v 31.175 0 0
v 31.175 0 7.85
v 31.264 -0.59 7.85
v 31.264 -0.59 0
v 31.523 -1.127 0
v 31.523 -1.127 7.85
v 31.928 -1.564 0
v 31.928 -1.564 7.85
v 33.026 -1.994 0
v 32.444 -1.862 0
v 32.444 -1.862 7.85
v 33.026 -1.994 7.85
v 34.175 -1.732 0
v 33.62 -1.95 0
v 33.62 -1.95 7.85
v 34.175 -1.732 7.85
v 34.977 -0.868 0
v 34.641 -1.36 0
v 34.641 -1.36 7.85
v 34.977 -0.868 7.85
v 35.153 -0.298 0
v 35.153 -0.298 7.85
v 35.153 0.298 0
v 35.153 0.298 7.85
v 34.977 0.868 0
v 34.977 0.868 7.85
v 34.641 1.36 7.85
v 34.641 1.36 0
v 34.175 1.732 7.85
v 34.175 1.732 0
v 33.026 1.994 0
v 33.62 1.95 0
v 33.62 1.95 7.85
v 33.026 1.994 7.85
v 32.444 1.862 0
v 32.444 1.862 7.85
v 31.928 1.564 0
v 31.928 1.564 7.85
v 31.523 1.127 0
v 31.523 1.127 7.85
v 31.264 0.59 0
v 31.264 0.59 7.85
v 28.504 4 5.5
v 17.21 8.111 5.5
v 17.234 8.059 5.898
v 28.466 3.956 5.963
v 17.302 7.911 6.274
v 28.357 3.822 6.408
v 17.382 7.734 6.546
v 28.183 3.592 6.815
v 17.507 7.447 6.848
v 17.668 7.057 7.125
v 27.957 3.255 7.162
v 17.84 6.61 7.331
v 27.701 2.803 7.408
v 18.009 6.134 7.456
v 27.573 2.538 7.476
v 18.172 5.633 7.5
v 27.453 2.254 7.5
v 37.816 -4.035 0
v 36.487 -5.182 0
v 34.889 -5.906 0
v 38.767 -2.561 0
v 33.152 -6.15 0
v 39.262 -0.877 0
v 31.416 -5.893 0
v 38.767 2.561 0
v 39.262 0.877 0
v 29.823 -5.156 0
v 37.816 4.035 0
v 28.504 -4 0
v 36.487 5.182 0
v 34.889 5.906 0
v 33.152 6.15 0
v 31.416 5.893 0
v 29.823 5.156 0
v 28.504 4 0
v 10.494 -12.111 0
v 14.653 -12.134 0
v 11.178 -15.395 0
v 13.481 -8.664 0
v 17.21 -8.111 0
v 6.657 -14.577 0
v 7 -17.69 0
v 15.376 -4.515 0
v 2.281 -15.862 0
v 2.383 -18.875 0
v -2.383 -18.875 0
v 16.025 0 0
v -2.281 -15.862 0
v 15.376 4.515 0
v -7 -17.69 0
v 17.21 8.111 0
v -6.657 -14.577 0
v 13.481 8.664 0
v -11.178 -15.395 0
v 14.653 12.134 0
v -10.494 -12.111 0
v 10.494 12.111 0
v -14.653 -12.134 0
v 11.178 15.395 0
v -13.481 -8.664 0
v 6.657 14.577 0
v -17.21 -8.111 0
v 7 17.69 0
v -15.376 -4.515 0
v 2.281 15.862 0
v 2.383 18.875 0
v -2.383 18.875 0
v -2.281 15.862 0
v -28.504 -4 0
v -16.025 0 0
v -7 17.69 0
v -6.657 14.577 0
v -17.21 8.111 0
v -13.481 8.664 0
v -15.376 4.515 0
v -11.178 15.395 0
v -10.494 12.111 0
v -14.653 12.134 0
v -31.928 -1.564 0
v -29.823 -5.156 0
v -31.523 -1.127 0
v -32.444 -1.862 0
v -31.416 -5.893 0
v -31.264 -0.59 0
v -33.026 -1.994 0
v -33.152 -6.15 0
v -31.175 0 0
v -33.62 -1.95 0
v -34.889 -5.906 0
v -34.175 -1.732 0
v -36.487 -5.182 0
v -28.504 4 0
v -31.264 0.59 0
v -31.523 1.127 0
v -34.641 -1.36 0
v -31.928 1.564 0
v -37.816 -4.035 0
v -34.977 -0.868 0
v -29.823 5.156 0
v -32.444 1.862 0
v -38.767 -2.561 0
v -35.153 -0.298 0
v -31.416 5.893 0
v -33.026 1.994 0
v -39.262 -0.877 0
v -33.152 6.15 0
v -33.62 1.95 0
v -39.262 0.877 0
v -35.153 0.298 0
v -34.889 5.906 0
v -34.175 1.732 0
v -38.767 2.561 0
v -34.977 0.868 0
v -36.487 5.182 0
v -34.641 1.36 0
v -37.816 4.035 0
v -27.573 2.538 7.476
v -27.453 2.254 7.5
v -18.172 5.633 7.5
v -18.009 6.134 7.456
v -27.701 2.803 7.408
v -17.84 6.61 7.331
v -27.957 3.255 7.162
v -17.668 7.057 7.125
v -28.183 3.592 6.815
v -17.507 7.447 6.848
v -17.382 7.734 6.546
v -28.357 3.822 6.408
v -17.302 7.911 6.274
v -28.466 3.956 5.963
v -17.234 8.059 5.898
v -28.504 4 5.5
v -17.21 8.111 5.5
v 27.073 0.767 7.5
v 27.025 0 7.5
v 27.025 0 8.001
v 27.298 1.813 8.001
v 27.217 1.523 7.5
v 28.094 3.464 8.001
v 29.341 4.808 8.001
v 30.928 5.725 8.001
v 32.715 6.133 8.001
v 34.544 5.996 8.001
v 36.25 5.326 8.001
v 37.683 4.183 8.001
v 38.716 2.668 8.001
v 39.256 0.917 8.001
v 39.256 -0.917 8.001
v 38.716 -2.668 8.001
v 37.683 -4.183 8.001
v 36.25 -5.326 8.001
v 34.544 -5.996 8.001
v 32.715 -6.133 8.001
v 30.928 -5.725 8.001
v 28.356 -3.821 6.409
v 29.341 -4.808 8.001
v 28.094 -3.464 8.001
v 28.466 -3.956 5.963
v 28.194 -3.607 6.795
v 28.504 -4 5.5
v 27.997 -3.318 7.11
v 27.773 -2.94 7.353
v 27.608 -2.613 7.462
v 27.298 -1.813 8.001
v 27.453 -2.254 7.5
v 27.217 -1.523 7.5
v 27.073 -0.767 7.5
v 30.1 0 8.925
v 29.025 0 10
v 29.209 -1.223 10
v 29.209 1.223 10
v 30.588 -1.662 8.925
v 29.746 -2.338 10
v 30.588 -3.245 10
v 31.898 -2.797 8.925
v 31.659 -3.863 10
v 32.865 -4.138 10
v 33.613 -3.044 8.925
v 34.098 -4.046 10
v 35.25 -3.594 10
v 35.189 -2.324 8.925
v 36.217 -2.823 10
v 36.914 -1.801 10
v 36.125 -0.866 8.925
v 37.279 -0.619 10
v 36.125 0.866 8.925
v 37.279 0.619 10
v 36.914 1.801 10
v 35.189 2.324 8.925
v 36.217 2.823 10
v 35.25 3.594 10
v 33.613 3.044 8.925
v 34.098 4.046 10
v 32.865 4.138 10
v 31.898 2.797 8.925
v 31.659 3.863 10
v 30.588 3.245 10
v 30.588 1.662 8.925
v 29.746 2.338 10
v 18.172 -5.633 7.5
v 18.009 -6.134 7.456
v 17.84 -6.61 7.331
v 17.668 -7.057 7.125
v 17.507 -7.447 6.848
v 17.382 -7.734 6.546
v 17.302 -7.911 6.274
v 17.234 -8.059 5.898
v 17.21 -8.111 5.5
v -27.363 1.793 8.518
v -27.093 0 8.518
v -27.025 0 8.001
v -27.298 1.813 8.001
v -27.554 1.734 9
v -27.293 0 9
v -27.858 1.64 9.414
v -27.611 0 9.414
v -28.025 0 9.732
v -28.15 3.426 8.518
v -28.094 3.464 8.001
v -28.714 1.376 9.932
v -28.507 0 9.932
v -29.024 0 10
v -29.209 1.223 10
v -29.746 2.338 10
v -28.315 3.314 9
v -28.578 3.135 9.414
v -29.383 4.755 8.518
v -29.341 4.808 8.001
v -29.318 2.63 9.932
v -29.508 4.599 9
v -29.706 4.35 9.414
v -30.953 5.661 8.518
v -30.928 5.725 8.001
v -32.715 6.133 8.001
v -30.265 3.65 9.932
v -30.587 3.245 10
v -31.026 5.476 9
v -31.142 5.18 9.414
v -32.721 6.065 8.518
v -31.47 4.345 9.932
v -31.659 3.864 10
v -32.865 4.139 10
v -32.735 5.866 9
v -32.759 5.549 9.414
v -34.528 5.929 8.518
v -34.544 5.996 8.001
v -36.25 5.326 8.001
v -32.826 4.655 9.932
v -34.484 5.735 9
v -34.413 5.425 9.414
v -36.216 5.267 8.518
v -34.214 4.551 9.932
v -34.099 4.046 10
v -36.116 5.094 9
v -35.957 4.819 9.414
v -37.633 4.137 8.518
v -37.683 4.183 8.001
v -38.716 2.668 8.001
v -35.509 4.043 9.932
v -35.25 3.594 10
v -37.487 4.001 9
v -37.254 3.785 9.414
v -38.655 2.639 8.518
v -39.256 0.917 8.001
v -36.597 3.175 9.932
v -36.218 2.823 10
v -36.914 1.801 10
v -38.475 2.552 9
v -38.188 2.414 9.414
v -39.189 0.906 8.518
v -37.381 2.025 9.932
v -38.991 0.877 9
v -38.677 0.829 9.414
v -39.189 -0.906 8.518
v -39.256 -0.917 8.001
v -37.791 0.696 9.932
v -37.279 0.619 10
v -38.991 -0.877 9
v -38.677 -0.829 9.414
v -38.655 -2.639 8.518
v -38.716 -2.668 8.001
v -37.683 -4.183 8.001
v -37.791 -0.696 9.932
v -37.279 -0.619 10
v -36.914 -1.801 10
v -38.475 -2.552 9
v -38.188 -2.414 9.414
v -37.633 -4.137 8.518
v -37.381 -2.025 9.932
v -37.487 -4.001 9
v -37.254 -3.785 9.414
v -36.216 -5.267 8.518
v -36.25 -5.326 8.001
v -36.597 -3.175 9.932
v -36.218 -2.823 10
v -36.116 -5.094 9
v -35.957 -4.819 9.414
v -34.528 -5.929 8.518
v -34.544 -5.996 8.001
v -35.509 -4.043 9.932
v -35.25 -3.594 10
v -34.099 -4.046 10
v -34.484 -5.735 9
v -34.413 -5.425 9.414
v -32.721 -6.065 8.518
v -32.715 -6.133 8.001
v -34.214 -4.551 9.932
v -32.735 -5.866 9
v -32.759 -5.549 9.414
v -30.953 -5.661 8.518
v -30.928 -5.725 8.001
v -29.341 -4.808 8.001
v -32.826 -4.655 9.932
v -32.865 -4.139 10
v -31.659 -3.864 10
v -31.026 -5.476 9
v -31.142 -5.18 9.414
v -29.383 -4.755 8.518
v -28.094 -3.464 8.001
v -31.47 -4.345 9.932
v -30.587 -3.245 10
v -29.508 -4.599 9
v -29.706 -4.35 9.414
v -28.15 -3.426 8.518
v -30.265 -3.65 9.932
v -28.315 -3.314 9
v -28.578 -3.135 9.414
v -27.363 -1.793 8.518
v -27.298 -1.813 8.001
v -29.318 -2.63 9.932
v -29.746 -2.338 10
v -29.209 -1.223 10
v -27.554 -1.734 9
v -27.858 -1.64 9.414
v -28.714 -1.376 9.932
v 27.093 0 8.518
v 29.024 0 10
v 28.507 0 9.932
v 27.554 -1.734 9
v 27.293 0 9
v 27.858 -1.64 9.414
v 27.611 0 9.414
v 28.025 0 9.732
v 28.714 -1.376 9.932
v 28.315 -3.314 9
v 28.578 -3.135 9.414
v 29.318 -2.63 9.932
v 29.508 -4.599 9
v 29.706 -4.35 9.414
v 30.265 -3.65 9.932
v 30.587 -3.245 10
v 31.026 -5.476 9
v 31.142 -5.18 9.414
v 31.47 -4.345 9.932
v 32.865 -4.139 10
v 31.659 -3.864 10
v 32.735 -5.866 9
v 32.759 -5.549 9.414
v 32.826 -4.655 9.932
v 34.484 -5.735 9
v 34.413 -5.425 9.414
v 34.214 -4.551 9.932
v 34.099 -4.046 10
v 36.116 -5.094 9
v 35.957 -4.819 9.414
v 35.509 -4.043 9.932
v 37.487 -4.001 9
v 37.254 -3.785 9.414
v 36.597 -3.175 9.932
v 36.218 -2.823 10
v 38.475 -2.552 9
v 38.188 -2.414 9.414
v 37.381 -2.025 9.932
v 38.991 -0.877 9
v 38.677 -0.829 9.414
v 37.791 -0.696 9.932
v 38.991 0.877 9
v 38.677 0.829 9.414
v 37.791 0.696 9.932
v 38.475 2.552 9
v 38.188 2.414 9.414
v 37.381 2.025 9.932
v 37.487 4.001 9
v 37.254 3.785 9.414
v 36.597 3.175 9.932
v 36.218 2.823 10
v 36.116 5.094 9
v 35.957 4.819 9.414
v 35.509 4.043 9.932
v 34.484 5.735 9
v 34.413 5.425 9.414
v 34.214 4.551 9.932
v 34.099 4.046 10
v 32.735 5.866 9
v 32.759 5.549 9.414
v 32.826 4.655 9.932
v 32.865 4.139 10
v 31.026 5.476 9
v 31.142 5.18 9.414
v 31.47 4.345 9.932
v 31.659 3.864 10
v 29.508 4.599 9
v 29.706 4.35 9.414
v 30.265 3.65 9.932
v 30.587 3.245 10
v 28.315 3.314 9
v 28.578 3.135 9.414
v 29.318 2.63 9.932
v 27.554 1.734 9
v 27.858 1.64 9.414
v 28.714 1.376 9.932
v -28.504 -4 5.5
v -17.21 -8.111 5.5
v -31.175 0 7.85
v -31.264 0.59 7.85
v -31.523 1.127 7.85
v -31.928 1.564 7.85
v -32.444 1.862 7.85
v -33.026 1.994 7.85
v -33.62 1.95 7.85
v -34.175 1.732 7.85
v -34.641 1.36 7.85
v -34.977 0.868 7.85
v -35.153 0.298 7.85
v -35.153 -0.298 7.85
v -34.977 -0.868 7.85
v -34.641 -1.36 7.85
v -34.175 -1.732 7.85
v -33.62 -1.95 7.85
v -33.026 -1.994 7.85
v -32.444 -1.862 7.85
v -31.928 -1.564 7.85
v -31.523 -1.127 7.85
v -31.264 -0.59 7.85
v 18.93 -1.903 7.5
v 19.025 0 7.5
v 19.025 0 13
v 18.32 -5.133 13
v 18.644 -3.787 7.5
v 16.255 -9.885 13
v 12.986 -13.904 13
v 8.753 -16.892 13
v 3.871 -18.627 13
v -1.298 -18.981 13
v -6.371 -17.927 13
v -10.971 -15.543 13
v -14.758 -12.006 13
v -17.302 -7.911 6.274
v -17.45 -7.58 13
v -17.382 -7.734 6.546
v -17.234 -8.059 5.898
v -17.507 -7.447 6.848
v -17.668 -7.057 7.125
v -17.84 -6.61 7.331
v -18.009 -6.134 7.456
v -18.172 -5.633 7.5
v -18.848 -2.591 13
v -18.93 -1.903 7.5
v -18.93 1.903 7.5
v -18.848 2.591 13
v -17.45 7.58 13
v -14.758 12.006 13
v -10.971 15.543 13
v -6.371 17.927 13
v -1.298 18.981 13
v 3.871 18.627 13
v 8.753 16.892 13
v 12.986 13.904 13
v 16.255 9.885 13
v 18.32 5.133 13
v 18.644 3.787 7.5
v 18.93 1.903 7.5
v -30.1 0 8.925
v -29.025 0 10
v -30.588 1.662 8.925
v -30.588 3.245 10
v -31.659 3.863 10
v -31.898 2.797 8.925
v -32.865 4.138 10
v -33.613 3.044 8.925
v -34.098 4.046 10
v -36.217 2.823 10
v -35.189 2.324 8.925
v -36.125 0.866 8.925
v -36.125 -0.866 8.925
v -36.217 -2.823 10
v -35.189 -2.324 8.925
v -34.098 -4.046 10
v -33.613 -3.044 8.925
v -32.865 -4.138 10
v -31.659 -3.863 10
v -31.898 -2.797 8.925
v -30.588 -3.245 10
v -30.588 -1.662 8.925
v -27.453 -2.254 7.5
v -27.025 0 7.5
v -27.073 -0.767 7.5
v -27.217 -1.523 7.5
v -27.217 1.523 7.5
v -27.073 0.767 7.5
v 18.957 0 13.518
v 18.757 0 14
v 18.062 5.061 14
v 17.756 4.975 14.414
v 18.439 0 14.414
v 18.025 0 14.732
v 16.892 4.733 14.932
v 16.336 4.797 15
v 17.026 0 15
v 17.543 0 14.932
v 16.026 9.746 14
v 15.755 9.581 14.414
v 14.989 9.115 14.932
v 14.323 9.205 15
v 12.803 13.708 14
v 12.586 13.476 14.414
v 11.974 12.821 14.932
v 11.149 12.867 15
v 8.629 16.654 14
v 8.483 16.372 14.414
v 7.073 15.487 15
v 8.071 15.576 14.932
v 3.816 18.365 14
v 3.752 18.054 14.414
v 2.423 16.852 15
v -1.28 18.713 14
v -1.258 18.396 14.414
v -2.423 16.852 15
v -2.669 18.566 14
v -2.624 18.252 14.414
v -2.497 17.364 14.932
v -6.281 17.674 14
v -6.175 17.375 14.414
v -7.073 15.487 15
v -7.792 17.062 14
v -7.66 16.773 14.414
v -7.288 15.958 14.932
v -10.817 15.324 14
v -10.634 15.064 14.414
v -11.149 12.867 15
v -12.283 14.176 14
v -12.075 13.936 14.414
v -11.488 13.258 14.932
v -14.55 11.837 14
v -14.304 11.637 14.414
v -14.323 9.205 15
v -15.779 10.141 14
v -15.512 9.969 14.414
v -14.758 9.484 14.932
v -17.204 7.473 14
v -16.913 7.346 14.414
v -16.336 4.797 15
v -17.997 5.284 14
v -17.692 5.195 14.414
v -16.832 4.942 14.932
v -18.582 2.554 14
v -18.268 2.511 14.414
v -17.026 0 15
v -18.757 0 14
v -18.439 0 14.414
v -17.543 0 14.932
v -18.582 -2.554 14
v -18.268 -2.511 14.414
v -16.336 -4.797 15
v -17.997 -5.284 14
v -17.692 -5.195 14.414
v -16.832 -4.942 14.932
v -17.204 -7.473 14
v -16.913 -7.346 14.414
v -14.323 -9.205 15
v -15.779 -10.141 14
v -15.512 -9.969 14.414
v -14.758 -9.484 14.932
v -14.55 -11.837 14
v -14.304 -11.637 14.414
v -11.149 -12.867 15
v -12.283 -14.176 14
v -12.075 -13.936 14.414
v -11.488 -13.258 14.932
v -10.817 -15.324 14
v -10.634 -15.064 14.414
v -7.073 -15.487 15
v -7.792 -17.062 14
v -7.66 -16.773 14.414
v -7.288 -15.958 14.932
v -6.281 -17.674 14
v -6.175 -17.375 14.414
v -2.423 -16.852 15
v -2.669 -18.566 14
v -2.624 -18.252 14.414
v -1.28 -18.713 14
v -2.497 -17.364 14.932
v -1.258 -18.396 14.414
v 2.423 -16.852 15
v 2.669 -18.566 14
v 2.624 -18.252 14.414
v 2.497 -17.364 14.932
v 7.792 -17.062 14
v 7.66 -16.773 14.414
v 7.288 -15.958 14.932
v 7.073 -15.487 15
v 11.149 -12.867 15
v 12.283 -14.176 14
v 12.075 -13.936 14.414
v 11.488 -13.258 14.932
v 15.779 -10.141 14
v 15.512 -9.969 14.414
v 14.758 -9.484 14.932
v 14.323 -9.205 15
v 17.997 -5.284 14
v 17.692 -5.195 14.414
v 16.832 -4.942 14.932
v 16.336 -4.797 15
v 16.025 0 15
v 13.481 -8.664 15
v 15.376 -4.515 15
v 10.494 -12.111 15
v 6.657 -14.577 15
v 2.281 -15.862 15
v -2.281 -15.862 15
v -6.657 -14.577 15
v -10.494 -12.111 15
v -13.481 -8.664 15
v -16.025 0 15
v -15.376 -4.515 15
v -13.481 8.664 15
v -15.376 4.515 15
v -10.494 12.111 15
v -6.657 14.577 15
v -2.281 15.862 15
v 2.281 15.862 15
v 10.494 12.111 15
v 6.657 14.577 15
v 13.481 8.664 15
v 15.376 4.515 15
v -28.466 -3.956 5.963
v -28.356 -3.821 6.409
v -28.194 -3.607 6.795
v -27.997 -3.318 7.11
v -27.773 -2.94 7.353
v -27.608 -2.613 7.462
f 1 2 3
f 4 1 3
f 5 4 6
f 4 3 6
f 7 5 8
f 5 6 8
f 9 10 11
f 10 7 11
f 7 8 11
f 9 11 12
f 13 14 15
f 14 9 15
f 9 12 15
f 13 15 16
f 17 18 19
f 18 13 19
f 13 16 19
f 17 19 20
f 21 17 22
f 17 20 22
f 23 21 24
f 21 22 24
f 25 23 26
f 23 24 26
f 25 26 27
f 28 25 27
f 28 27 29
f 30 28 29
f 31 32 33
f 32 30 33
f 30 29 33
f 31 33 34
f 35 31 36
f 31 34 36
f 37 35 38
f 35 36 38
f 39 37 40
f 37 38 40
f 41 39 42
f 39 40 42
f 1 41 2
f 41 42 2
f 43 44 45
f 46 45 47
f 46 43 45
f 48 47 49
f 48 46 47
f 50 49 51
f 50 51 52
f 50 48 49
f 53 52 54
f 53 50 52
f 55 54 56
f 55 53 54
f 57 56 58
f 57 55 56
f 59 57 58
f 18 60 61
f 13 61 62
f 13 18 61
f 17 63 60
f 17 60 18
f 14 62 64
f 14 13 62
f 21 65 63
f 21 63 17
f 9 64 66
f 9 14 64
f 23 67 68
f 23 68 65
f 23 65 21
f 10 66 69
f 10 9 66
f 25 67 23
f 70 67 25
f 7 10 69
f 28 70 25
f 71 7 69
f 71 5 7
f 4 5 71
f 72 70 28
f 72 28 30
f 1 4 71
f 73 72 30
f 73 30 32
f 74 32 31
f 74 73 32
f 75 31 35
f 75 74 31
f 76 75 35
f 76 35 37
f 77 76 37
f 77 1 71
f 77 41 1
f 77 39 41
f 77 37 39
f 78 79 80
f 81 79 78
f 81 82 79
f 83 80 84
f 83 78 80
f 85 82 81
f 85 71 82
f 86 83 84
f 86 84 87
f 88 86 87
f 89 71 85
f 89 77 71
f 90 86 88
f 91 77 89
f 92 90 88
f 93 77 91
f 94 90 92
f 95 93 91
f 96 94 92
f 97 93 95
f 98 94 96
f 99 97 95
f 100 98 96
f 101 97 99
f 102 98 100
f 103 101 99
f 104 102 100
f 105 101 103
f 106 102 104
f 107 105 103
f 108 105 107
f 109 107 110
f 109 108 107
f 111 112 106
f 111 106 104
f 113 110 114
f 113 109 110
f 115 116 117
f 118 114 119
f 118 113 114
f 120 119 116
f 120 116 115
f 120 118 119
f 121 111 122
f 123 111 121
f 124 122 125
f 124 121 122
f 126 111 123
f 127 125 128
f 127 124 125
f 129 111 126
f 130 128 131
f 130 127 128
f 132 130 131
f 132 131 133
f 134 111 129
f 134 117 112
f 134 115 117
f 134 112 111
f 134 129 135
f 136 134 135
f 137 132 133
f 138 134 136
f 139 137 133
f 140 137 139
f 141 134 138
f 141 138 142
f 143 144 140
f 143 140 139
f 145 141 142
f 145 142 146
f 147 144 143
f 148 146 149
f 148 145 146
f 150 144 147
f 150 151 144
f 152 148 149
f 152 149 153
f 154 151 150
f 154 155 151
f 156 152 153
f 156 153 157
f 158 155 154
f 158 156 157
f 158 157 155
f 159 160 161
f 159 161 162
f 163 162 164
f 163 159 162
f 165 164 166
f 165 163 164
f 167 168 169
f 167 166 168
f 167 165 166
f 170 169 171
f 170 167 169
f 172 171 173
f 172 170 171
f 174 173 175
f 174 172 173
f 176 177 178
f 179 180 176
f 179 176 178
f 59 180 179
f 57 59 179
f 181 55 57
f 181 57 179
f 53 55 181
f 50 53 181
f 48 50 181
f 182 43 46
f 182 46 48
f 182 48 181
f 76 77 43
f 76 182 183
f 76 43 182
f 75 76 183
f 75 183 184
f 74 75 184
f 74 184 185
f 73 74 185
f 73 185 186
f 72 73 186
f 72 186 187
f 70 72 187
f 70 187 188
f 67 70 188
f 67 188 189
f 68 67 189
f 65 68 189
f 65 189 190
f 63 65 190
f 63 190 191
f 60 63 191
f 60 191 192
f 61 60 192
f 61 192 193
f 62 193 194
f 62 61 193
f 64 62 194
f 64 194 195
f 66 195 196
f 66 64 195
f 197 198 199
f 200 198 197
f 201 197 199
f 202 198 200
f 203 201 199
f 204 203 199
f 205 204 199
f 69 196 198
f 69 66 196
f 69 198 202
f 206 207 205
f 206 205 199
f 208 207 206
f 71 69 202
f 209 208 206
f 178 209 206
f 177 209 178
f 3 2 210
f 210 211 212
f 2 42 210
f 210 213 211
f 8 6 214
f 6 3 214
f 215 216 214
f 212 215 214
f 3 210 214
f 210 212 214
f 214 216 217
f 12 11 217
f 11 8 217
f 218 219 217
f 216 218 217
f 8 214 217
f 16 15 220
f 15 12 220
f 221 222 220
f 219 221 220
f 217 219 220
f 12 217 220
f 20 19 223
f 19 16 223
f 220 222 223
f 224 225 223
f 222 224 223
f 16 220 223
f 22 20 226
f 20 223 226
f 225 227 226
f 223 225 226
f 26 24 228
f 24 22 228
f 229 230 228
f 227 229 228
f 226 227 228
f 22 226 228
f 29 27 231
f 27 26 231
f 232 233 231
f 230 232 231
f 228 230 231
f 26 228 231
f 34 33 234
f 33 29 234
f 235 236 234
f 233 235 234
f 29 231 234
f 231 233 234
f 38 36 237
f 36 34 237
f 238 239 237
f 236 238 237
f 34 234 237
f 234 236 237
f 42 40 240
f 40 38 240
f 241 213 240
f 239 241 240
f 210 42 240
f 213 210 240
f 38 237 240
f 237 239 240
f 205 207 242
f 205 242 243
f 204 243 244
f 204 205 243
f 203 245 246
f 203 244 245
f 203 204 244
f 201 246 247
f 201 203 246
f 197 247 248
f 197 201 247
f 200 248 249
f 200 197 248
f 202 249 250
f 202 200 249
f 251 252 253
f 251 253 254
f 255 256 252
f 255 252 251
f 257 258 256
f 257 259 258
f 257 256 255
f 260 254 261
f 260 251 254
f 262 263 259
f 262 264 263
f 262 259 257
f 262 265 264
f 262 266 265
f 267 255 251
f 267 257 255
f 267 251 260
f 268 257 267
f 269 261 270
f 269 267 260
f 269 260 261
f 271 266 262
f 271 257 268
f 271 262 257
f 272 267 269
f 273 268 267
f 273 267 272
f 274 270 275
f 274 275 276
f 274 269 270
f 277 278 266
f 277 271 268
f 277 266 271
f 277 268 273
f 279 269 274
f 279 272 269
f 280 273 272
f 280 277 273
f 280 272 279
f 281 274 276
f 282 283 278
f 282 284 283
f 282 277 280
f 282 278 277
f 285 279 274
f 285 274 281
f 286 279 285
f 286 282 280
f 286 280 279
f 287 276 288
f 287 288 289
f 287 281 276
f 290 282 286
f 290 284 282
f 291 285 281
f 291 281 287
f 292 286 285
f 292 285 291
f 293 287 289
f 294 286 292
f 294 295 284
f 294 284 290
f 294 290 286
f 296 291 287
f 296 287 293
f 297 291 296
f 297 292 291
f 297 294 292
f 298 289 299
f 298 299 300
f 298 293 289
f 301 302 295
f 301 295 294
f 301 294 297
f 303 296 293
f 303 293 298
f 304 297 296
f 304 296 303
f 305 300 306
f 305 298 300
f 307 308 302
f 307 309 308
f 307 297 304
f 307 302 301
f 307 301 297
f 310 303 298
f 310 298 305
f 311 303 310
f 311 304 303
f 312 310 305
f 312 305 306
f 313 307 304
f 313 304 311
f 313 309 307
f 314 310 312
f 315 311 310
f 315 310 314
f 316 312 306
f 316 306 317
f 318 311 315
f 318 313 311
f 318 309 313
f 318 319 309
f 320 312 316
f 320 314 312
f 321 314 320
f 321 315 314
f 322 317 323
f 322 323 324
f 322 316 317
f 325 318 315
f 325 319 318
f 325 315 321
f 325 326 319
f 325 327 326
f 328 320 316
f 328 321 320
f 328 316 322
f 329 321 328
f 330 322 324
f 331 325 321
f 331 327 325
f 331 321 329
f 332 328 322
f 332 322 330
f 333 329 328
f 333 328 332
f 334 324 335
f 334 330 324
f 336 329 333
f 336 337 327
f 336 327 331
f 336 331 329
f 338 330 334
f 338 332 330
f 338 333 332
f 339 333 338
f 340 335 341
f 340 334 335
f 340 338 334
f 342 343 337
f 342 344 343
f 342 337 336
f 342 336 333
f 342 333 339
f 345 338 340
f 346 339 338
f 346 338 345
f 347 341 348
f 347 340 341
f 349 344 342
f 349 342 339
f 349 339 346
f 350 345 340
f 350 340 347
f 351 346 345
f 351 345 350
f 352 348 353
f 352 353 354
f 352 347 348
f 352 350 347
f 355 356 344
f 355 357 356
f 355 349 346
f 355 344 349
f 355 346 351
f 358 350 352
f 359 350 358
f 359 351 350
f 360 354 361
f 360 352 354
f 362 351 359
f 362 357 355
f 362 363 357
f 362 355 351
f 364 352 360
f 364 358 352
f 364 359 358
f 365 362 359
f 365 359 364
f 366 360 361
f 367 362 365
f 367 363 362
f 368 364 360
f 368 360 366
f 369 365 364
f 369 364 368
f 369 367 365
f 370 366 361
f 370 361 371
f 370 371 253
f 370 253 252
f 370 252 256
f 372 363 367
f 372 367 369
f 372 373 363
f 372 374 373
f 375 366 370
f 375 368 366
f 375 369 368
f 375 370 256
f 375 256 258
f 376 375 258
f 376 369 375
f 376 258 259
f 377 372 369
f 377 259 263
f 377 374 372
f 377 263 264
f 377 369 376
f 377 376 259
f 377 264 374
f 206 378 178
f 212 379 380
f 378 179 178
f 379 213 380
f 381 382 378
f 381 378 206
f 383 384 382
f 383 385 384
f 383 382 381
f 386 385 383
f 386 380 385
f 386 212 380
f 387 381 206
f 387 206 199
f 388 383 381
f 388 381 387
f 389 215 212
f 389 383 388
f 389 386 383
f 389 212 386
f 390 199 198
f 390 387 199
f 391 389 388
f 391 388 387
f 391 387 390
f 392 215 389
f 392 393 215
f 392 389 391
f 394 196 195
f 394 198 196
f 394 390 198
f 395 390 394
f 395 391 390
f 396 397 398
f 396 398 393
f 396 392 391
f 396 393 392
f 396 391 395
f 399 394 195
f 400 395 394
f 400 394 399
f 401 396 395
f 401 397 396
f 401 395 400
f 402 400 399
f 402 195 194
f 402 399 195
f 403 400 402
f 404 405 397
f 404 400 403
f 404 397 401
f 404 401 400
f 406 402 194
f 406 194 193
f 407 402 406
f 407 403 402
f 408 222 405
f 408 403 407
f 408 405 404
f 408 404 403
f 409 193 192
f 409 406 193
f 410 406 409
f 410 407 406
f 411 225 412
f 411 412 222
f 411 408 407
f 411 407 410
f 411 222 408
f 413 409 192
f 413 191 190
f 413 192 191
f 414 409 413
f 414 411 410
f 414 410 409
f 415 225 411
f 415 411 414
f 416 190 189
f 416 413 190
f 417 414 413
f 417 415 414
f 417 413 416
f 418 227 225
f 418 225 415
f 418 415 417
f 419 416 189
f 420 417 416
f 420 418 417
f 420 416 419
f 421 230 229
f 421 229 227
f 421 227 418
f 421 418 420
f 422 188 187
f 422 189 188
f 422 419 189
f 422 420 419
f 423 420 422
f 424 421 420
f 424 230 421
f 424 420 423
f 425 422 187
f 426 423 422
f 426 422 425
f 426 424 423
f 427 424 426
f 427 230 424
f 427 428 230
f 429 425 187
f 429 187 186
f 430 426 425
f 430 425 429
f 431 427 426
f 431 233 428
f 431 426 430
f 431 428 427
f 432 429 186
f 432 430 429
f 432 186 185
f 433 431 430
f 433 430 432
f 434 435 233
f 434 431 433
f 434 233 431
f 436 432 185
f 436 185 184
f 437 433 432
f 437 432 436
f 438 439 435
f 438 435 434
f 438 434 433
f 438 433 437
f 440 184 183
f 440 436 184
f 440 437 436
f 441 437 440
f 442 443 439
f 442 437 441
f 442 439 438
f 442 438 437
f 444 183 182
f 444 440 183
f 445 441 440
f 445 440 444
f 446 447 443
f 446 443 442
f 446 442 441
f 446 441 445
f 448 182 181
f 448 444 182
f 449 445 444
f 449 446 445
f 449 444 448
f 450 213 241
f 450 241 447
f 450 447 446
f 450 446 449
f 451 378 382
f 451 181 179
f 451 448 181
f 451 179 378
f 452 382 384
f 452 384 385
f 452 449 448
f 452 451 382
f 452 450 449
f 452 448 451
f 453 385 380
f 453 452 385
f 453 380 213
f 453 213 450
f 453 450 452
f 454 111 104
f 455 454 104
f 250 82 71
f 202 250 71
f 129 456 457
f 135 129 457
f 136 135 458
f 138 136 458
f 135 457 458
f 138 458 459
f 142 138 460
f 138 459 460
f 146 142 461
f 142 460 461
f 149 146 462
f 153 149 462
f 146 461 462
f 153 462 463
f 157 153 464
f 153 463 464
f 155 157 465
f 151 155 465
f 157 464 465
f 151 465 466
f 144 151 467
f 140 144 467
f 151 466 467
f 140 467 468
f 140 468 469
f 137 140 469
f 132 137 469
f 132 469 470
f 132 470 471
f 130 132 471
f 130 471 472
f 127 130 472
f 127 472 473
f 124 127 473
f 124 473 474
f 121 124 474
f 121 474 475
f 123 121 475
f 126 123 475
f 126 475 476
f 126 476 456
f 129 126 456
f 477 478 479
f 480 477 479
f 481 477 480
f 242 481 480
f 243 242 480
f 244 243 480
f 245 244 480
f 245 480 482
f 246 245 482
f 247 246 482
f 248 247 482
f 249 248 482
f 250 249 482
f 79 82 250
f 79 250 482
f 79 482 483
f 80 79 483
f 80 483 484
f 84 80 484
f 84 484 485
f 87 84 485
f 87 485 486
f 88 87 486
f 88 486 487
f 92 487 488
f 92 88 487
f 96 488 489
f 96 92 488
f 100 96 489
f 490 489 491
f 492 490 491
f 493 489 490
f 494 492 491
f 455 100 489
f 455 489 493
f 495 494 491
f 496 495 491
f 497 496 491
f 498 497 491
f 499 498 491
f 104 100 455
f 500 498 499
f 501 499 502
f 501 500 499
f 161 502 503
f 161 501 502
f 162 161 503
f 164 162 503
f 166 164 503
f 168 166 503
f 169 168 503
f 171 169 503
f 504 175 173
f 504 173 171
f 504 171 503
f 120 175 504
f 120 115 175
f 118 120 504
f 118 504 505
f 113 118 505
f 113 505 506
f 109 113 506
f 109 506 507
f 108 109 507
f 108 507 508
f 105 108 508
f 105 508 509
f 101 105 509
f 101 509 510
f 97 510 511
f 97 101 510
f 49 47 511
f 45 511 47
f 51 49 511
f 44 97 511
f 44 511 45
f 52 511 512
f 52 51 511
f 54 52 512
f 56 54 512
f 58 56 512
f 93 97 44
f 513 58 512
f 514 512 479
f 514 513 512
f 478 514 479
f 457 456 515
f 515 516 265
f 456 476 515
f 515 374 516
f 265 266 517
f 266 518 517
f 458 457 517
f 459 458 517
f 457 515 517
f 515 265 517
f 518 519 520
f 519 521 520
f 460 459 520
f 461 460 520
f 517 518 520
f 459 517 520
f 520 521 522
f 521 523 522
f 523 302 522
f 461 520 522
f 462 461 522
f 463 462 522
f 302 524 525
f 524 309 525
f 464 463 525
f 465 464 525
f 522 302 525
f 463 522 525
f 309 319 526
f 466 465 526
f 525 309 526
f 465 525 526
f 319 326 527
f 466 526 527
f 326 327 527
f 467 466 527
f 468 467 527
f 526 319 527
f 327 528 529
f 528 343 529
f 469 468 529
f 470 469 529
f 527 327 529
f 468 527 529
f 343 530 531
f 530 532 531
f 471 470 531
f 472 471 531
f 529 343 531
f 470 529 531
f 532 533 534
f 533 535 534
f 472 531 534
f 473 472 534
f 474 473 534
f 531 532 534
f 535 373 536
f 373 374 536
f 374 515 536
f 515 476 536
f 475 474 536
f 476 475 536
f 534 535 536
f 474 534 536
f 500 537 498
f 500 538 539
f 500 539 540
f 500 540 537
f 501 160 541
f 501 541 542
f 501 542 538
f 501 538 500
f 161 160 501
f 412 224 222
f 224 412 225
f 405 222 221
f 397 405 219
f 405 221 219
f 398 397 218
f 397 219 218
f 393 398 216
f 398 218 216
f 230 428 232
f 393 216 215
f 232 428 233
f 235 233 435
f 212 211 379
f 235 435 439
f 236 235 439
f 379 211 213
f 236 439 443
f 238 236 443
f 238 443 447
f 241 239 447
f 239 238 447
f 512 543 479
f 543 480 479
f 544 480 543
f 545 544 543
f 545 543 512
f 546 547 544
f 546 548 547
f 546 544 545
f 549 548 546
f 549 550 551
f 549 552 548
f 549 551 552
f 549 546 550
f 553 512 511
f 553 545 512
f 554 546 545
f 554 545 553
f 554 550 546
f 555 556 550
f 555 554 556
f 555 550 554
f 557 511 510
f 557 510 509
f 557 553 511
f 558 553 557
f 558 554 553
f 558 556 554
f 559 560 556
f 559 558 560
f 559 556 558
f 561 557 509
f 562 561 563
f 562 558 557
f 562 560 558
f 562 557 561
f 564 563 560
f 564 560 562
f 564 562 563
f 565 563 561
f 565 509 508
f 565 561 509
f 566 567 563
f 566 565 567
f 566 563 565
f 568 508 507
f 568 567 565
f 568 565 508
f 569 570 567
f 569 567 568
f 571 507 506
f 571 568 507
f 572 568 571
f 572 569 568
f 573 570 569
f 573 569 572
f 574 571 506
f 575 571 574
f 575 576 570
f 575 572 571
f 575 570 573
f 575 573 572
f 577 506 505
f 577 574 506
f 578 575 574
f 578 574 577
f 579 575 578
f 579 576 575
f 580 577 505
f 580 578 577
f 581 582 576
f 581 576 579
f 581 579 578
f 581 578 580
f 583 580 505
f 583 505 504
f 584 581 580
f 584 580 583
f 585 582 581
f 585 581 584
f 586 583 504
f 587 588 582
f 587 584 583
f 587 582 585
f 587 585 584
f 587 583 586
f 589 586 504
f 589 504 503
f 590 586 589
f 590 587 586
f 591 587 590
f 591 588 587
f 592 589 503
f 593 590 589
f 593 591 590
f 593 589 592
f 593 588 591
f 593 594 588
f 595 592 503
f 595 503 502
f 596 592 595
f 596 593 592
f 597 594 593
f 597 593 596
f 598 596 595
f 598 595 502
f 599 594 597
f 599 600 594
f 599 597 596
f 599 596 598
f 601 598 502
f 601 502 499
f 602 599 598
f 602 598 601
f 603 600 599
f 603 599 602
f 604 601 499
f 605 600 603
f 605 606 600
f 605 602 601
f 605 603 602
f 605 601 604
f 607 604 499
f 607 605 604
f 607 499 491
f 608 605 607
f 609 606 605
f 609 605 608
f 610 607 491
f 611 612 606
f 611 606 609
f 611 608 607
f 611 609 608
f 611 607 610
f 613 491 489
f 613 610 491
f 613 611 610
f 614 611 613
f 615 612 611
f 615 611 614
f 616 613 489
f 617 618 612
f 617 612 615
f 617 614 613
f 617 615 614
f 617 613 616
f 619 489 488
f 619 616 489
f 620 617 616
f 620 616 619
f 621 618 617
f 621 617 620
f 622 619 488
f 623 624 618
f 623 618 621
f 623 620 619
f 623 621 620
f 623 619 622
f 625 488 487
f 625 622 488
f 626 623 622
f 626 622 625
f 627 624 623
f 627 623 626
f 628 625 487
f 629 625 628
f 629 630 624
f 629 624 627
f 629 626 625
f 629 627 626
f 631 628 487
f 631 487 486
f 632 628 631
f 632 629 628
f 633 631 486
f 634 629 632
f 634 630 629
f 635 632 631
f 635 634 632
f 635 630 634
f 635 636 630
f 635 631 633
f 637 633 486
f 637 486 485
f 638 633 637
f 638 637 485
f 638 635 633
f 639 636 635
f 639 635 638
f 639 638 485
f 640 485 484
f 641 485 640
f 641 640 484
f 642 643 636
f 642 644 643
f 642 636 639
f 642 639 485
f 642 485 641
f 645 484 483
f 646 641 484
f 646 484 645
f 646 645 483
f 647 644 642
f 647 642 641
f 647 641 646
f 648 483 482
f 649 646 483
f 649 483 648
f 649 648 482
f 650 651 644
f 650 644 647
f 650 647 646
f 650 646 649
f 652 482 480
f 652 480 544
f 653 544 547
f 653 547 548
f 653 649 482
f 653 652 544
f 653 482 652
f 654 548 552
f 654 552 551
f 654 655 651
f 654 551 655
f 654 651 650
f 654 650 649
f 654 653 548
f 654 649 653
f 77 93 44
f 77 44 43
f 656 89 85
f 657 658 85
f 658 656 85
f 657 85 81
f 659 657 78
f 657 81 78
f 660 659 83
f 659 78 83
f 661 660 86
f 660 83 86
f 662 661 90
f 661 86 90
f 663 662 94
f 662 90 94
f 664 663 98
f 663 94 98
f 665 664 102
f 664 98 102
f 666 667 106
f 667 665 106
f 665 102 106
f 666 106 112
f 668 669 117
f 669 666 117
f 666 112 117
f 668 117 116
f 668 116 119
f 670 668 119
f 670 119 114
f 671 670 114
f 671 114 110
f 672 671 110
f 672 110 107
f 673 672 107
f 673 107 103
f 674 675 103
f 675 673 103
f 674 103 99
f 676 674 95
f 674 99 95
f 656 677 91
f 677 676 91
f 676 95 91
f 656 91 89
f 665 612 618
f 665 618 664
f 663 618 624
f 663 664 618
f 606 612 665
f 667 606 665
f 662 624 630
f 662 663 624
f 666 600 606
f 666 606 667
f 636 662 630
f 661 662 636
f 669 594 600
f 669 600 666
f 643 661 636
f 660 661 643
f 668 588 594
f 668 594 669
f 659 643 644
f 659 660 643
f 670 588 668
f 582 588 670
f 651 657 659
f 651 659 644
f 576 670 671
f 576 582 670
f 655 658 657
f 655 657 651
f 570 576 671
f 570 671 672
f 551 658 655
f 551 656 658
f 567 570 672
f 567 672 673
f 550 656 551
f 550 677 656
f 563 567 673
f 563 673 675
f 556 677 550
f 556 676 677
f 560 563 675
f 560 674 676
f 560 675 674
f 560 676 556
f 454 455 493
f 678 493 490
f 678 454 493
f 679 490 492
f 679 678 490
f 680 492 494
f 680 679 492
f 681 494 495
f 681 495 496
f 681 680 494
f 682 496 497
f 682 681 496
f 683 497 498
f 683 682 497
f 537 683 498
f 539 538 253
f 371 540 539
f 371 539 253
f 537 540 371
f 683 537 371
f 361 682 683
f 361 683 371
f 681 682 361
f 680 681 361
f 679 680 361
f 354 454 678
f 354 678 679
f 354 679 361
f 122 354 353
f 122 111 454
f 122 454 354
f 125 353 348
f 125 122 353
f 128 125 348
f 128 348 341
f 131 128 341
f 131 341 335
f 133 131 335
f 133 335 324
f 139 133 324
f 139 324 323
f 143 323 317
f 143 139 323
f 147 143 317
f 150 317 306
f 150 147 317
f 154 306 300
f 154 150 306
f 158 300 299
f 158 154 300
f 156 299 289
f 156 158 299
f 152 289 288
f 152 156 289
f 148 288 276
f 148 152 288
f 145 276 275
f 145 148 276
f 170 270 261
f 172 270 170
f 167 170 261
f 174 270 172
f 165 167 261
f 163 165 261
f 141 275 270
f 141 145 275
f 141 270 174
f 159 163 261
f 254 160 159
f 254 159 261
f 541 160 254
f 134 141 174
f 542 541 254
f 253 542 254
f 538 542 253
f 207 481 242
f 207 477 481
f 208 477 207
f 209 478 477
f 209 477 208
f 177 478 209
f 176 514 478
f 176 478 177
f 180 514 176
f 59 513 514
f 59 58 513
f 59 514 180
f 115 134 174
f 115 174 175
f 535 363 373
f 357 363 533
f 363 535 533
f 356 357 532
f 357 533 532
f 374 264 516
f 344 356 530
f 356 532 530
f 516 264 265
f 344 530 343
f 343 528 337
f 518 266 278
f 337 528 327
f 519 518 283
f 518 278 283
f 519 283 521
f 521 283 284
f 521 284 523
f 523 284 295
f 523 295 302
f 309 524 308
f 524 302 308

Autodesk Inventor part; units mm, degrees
ref_plane "YZ Plane" through (0, 0, 0) normal (1, 0, 0) x (0, 1, 0)
ref_plane "XZ Plane" through (0, 0, 0) normal (0, 1, 0) x (-1, 0, 0)
ref_plane "XY Plane" through (0, 0, 0) normal (0, 0, 1) x (1, 0, 0)
sketch "Tube_Core_Skt" plane through (0, 0, 0) normal (0, 0, 1) x (1, 0, 0)
  circle A0 centre (0, 0) radius 16.025
  circle A1 centre (0, 0) radius 19.025
  dimension "d2" = 3
  dimension "d3" = 32.05
extrude "Tube_Core" add sketch "Tube_Core_Skt" along normal blind 15
sketch "Screw_Core_Skt" plane through (0, 0, 0) normal (0, 1, 0) x (-1, 0, 0)
  line L0 (-19.025, 0) -> (-19.025, 15) projected
  line L1 (19.025, 15) -> (-19.025, 15) projected
  line L2 (19.025, 0) -> (19.025, 15) projected
  line L3 (-19.025, 0) -> (19.025, 0) projected
  line L4 (0, 15) -> (-27.025, 15) construction
  line L5 (-27.025, 15) -> (-27.025, 10) construction
  line L6 (-27.025, 0) -> (0, 0) construction
  line L7 (0, 0) -> (0, 15) construction
  line L8 (-27.025, 15) -> (-33.175, 15) construction
  line L9 (-33.175, 15) -> (-33.175, 0) construction
  line L10 (-33.175, 0) -> (-27.025, 0) construction
  line L11 (-33.175, 10) -> (-27.025, 10) construction
  line L12 (-27.025, 10) -> (-27.025, 0) construction
  line L13 (-31.175, 0) -> (-31.175, 7.85)
  line L14 (-31.175, 7.85) -> (-29.025, 10)
  line L15 (-27.025, 10) -> (-27.025, 0)
  line L16 (-31.175, 0) -> (-27.025, 0)
  line L17 (-29.025, 10) -> (-27.025, 10)
  point P0 (0, 0)
  dimension "d11" = 10
  dimension "d12" = 8
  dimension "d13" = 6.15
  dimension "d14" = 2
  dimension "d15" = 2
  dimension "d16" = 45
revolve "Screw_Core" add sketch "Screw_Core_Skt" angle 360 about axis through (33.175, 0, 15) along (0, 0, -1) contours L13 L14 L17 L15 L16
sketch "Screw_Bridge_Skt" plane through (0, 0, 0) normal (0, 0, 1) x (1, 0, 0)
  circle A0 centre (0, 0) radius 19.025 projected
  circle A1 centre (33.175, 0) radius 6.15 projected
  circle A2 centre (0, 0) radius 19.025 projected
  line L0 (17.2095, 8.1107) -> (28.5035, 4)
  line L1 (17.2095, -8.1107) -> (28.5035, -4)
  line L2 (0, 0) -> (33.175, 0) construction
  point P0 (35.15, 0)
  dimension "d25" = 4
  dimension "d26" = 20
extrude "Screw_Bridge" add sketch "Screw_Bridge_Skt" along normal blind 7.5 contours A0 L0 A1 L1
mirror "Screw_Copy" about plane through (0, 0, 0) normal (1, 0, 0) of "Screw_Bridge", "Screw_Core"
fillet "Fillet" radius 2 7 edges at (-19.025, 0, 15) (22.8565, -6.0553, 7.5) (22.8565, 6.0553, 7.5) (39.325, 0, 10) (-22.8565, -6.0553, 7.5) (-22.8565, 6.0553, 7.5) (-39.325, 0, 10)
equation "\"d2\" = tube_wall_width"
equation "\"d3\" = tube_diam + tube_tolerance"
equation "\"d4\" = tube_wall_height"
equation "\"d11\" = screw_height"
equation "\"d12\" = screw_spacing"
equation "\"d13\" = 0.5 * screw_head_diam + screw_wall_width"
equation "\"d14\" = 0.5 * screw_tolerance + 0.5 * screw_body_diam"
equation "\"d15\" = screw_wall_width"
equation "\"d25\" = 2 * screw_wall_width"
equation "\"d27\" = 0.75 * screw_height"
equation "\"d41\" = fillet"
equation "\"tube_diam\" = 31.8"
equation "\"screw_body_diam\" = 3"
equation "\"screw_head_diam\" = 8.3"
equation "\"screw_head_height\" = 3"
equation "\"screw_spacing\" = 8"
equation "\"screw_height\" = 10"
equation "\"tube_tolerance\" = 0.25"
equation "\"tube_wall_width\" = 3"
equation "\"tube_wall_height\" = 15"
equation "\"screw_wall_width\" = 2"
equation "\"fillet\" = 2"
equation "\"tube_base\" = 2"
equation "\"tube_base_height\" = 2"
equation "\"screw_tolerance\" = 1"
equation "\"screw_length\" = 12.7"
equation "\"wood_width\" = 15"
equation "\"block_height\" = 15"
equation "\"screw_head_ang\" = 71.666667deg"
equation "\"screw_head_m\" = 71.666667deg"
properties part number "Counter_Support"
